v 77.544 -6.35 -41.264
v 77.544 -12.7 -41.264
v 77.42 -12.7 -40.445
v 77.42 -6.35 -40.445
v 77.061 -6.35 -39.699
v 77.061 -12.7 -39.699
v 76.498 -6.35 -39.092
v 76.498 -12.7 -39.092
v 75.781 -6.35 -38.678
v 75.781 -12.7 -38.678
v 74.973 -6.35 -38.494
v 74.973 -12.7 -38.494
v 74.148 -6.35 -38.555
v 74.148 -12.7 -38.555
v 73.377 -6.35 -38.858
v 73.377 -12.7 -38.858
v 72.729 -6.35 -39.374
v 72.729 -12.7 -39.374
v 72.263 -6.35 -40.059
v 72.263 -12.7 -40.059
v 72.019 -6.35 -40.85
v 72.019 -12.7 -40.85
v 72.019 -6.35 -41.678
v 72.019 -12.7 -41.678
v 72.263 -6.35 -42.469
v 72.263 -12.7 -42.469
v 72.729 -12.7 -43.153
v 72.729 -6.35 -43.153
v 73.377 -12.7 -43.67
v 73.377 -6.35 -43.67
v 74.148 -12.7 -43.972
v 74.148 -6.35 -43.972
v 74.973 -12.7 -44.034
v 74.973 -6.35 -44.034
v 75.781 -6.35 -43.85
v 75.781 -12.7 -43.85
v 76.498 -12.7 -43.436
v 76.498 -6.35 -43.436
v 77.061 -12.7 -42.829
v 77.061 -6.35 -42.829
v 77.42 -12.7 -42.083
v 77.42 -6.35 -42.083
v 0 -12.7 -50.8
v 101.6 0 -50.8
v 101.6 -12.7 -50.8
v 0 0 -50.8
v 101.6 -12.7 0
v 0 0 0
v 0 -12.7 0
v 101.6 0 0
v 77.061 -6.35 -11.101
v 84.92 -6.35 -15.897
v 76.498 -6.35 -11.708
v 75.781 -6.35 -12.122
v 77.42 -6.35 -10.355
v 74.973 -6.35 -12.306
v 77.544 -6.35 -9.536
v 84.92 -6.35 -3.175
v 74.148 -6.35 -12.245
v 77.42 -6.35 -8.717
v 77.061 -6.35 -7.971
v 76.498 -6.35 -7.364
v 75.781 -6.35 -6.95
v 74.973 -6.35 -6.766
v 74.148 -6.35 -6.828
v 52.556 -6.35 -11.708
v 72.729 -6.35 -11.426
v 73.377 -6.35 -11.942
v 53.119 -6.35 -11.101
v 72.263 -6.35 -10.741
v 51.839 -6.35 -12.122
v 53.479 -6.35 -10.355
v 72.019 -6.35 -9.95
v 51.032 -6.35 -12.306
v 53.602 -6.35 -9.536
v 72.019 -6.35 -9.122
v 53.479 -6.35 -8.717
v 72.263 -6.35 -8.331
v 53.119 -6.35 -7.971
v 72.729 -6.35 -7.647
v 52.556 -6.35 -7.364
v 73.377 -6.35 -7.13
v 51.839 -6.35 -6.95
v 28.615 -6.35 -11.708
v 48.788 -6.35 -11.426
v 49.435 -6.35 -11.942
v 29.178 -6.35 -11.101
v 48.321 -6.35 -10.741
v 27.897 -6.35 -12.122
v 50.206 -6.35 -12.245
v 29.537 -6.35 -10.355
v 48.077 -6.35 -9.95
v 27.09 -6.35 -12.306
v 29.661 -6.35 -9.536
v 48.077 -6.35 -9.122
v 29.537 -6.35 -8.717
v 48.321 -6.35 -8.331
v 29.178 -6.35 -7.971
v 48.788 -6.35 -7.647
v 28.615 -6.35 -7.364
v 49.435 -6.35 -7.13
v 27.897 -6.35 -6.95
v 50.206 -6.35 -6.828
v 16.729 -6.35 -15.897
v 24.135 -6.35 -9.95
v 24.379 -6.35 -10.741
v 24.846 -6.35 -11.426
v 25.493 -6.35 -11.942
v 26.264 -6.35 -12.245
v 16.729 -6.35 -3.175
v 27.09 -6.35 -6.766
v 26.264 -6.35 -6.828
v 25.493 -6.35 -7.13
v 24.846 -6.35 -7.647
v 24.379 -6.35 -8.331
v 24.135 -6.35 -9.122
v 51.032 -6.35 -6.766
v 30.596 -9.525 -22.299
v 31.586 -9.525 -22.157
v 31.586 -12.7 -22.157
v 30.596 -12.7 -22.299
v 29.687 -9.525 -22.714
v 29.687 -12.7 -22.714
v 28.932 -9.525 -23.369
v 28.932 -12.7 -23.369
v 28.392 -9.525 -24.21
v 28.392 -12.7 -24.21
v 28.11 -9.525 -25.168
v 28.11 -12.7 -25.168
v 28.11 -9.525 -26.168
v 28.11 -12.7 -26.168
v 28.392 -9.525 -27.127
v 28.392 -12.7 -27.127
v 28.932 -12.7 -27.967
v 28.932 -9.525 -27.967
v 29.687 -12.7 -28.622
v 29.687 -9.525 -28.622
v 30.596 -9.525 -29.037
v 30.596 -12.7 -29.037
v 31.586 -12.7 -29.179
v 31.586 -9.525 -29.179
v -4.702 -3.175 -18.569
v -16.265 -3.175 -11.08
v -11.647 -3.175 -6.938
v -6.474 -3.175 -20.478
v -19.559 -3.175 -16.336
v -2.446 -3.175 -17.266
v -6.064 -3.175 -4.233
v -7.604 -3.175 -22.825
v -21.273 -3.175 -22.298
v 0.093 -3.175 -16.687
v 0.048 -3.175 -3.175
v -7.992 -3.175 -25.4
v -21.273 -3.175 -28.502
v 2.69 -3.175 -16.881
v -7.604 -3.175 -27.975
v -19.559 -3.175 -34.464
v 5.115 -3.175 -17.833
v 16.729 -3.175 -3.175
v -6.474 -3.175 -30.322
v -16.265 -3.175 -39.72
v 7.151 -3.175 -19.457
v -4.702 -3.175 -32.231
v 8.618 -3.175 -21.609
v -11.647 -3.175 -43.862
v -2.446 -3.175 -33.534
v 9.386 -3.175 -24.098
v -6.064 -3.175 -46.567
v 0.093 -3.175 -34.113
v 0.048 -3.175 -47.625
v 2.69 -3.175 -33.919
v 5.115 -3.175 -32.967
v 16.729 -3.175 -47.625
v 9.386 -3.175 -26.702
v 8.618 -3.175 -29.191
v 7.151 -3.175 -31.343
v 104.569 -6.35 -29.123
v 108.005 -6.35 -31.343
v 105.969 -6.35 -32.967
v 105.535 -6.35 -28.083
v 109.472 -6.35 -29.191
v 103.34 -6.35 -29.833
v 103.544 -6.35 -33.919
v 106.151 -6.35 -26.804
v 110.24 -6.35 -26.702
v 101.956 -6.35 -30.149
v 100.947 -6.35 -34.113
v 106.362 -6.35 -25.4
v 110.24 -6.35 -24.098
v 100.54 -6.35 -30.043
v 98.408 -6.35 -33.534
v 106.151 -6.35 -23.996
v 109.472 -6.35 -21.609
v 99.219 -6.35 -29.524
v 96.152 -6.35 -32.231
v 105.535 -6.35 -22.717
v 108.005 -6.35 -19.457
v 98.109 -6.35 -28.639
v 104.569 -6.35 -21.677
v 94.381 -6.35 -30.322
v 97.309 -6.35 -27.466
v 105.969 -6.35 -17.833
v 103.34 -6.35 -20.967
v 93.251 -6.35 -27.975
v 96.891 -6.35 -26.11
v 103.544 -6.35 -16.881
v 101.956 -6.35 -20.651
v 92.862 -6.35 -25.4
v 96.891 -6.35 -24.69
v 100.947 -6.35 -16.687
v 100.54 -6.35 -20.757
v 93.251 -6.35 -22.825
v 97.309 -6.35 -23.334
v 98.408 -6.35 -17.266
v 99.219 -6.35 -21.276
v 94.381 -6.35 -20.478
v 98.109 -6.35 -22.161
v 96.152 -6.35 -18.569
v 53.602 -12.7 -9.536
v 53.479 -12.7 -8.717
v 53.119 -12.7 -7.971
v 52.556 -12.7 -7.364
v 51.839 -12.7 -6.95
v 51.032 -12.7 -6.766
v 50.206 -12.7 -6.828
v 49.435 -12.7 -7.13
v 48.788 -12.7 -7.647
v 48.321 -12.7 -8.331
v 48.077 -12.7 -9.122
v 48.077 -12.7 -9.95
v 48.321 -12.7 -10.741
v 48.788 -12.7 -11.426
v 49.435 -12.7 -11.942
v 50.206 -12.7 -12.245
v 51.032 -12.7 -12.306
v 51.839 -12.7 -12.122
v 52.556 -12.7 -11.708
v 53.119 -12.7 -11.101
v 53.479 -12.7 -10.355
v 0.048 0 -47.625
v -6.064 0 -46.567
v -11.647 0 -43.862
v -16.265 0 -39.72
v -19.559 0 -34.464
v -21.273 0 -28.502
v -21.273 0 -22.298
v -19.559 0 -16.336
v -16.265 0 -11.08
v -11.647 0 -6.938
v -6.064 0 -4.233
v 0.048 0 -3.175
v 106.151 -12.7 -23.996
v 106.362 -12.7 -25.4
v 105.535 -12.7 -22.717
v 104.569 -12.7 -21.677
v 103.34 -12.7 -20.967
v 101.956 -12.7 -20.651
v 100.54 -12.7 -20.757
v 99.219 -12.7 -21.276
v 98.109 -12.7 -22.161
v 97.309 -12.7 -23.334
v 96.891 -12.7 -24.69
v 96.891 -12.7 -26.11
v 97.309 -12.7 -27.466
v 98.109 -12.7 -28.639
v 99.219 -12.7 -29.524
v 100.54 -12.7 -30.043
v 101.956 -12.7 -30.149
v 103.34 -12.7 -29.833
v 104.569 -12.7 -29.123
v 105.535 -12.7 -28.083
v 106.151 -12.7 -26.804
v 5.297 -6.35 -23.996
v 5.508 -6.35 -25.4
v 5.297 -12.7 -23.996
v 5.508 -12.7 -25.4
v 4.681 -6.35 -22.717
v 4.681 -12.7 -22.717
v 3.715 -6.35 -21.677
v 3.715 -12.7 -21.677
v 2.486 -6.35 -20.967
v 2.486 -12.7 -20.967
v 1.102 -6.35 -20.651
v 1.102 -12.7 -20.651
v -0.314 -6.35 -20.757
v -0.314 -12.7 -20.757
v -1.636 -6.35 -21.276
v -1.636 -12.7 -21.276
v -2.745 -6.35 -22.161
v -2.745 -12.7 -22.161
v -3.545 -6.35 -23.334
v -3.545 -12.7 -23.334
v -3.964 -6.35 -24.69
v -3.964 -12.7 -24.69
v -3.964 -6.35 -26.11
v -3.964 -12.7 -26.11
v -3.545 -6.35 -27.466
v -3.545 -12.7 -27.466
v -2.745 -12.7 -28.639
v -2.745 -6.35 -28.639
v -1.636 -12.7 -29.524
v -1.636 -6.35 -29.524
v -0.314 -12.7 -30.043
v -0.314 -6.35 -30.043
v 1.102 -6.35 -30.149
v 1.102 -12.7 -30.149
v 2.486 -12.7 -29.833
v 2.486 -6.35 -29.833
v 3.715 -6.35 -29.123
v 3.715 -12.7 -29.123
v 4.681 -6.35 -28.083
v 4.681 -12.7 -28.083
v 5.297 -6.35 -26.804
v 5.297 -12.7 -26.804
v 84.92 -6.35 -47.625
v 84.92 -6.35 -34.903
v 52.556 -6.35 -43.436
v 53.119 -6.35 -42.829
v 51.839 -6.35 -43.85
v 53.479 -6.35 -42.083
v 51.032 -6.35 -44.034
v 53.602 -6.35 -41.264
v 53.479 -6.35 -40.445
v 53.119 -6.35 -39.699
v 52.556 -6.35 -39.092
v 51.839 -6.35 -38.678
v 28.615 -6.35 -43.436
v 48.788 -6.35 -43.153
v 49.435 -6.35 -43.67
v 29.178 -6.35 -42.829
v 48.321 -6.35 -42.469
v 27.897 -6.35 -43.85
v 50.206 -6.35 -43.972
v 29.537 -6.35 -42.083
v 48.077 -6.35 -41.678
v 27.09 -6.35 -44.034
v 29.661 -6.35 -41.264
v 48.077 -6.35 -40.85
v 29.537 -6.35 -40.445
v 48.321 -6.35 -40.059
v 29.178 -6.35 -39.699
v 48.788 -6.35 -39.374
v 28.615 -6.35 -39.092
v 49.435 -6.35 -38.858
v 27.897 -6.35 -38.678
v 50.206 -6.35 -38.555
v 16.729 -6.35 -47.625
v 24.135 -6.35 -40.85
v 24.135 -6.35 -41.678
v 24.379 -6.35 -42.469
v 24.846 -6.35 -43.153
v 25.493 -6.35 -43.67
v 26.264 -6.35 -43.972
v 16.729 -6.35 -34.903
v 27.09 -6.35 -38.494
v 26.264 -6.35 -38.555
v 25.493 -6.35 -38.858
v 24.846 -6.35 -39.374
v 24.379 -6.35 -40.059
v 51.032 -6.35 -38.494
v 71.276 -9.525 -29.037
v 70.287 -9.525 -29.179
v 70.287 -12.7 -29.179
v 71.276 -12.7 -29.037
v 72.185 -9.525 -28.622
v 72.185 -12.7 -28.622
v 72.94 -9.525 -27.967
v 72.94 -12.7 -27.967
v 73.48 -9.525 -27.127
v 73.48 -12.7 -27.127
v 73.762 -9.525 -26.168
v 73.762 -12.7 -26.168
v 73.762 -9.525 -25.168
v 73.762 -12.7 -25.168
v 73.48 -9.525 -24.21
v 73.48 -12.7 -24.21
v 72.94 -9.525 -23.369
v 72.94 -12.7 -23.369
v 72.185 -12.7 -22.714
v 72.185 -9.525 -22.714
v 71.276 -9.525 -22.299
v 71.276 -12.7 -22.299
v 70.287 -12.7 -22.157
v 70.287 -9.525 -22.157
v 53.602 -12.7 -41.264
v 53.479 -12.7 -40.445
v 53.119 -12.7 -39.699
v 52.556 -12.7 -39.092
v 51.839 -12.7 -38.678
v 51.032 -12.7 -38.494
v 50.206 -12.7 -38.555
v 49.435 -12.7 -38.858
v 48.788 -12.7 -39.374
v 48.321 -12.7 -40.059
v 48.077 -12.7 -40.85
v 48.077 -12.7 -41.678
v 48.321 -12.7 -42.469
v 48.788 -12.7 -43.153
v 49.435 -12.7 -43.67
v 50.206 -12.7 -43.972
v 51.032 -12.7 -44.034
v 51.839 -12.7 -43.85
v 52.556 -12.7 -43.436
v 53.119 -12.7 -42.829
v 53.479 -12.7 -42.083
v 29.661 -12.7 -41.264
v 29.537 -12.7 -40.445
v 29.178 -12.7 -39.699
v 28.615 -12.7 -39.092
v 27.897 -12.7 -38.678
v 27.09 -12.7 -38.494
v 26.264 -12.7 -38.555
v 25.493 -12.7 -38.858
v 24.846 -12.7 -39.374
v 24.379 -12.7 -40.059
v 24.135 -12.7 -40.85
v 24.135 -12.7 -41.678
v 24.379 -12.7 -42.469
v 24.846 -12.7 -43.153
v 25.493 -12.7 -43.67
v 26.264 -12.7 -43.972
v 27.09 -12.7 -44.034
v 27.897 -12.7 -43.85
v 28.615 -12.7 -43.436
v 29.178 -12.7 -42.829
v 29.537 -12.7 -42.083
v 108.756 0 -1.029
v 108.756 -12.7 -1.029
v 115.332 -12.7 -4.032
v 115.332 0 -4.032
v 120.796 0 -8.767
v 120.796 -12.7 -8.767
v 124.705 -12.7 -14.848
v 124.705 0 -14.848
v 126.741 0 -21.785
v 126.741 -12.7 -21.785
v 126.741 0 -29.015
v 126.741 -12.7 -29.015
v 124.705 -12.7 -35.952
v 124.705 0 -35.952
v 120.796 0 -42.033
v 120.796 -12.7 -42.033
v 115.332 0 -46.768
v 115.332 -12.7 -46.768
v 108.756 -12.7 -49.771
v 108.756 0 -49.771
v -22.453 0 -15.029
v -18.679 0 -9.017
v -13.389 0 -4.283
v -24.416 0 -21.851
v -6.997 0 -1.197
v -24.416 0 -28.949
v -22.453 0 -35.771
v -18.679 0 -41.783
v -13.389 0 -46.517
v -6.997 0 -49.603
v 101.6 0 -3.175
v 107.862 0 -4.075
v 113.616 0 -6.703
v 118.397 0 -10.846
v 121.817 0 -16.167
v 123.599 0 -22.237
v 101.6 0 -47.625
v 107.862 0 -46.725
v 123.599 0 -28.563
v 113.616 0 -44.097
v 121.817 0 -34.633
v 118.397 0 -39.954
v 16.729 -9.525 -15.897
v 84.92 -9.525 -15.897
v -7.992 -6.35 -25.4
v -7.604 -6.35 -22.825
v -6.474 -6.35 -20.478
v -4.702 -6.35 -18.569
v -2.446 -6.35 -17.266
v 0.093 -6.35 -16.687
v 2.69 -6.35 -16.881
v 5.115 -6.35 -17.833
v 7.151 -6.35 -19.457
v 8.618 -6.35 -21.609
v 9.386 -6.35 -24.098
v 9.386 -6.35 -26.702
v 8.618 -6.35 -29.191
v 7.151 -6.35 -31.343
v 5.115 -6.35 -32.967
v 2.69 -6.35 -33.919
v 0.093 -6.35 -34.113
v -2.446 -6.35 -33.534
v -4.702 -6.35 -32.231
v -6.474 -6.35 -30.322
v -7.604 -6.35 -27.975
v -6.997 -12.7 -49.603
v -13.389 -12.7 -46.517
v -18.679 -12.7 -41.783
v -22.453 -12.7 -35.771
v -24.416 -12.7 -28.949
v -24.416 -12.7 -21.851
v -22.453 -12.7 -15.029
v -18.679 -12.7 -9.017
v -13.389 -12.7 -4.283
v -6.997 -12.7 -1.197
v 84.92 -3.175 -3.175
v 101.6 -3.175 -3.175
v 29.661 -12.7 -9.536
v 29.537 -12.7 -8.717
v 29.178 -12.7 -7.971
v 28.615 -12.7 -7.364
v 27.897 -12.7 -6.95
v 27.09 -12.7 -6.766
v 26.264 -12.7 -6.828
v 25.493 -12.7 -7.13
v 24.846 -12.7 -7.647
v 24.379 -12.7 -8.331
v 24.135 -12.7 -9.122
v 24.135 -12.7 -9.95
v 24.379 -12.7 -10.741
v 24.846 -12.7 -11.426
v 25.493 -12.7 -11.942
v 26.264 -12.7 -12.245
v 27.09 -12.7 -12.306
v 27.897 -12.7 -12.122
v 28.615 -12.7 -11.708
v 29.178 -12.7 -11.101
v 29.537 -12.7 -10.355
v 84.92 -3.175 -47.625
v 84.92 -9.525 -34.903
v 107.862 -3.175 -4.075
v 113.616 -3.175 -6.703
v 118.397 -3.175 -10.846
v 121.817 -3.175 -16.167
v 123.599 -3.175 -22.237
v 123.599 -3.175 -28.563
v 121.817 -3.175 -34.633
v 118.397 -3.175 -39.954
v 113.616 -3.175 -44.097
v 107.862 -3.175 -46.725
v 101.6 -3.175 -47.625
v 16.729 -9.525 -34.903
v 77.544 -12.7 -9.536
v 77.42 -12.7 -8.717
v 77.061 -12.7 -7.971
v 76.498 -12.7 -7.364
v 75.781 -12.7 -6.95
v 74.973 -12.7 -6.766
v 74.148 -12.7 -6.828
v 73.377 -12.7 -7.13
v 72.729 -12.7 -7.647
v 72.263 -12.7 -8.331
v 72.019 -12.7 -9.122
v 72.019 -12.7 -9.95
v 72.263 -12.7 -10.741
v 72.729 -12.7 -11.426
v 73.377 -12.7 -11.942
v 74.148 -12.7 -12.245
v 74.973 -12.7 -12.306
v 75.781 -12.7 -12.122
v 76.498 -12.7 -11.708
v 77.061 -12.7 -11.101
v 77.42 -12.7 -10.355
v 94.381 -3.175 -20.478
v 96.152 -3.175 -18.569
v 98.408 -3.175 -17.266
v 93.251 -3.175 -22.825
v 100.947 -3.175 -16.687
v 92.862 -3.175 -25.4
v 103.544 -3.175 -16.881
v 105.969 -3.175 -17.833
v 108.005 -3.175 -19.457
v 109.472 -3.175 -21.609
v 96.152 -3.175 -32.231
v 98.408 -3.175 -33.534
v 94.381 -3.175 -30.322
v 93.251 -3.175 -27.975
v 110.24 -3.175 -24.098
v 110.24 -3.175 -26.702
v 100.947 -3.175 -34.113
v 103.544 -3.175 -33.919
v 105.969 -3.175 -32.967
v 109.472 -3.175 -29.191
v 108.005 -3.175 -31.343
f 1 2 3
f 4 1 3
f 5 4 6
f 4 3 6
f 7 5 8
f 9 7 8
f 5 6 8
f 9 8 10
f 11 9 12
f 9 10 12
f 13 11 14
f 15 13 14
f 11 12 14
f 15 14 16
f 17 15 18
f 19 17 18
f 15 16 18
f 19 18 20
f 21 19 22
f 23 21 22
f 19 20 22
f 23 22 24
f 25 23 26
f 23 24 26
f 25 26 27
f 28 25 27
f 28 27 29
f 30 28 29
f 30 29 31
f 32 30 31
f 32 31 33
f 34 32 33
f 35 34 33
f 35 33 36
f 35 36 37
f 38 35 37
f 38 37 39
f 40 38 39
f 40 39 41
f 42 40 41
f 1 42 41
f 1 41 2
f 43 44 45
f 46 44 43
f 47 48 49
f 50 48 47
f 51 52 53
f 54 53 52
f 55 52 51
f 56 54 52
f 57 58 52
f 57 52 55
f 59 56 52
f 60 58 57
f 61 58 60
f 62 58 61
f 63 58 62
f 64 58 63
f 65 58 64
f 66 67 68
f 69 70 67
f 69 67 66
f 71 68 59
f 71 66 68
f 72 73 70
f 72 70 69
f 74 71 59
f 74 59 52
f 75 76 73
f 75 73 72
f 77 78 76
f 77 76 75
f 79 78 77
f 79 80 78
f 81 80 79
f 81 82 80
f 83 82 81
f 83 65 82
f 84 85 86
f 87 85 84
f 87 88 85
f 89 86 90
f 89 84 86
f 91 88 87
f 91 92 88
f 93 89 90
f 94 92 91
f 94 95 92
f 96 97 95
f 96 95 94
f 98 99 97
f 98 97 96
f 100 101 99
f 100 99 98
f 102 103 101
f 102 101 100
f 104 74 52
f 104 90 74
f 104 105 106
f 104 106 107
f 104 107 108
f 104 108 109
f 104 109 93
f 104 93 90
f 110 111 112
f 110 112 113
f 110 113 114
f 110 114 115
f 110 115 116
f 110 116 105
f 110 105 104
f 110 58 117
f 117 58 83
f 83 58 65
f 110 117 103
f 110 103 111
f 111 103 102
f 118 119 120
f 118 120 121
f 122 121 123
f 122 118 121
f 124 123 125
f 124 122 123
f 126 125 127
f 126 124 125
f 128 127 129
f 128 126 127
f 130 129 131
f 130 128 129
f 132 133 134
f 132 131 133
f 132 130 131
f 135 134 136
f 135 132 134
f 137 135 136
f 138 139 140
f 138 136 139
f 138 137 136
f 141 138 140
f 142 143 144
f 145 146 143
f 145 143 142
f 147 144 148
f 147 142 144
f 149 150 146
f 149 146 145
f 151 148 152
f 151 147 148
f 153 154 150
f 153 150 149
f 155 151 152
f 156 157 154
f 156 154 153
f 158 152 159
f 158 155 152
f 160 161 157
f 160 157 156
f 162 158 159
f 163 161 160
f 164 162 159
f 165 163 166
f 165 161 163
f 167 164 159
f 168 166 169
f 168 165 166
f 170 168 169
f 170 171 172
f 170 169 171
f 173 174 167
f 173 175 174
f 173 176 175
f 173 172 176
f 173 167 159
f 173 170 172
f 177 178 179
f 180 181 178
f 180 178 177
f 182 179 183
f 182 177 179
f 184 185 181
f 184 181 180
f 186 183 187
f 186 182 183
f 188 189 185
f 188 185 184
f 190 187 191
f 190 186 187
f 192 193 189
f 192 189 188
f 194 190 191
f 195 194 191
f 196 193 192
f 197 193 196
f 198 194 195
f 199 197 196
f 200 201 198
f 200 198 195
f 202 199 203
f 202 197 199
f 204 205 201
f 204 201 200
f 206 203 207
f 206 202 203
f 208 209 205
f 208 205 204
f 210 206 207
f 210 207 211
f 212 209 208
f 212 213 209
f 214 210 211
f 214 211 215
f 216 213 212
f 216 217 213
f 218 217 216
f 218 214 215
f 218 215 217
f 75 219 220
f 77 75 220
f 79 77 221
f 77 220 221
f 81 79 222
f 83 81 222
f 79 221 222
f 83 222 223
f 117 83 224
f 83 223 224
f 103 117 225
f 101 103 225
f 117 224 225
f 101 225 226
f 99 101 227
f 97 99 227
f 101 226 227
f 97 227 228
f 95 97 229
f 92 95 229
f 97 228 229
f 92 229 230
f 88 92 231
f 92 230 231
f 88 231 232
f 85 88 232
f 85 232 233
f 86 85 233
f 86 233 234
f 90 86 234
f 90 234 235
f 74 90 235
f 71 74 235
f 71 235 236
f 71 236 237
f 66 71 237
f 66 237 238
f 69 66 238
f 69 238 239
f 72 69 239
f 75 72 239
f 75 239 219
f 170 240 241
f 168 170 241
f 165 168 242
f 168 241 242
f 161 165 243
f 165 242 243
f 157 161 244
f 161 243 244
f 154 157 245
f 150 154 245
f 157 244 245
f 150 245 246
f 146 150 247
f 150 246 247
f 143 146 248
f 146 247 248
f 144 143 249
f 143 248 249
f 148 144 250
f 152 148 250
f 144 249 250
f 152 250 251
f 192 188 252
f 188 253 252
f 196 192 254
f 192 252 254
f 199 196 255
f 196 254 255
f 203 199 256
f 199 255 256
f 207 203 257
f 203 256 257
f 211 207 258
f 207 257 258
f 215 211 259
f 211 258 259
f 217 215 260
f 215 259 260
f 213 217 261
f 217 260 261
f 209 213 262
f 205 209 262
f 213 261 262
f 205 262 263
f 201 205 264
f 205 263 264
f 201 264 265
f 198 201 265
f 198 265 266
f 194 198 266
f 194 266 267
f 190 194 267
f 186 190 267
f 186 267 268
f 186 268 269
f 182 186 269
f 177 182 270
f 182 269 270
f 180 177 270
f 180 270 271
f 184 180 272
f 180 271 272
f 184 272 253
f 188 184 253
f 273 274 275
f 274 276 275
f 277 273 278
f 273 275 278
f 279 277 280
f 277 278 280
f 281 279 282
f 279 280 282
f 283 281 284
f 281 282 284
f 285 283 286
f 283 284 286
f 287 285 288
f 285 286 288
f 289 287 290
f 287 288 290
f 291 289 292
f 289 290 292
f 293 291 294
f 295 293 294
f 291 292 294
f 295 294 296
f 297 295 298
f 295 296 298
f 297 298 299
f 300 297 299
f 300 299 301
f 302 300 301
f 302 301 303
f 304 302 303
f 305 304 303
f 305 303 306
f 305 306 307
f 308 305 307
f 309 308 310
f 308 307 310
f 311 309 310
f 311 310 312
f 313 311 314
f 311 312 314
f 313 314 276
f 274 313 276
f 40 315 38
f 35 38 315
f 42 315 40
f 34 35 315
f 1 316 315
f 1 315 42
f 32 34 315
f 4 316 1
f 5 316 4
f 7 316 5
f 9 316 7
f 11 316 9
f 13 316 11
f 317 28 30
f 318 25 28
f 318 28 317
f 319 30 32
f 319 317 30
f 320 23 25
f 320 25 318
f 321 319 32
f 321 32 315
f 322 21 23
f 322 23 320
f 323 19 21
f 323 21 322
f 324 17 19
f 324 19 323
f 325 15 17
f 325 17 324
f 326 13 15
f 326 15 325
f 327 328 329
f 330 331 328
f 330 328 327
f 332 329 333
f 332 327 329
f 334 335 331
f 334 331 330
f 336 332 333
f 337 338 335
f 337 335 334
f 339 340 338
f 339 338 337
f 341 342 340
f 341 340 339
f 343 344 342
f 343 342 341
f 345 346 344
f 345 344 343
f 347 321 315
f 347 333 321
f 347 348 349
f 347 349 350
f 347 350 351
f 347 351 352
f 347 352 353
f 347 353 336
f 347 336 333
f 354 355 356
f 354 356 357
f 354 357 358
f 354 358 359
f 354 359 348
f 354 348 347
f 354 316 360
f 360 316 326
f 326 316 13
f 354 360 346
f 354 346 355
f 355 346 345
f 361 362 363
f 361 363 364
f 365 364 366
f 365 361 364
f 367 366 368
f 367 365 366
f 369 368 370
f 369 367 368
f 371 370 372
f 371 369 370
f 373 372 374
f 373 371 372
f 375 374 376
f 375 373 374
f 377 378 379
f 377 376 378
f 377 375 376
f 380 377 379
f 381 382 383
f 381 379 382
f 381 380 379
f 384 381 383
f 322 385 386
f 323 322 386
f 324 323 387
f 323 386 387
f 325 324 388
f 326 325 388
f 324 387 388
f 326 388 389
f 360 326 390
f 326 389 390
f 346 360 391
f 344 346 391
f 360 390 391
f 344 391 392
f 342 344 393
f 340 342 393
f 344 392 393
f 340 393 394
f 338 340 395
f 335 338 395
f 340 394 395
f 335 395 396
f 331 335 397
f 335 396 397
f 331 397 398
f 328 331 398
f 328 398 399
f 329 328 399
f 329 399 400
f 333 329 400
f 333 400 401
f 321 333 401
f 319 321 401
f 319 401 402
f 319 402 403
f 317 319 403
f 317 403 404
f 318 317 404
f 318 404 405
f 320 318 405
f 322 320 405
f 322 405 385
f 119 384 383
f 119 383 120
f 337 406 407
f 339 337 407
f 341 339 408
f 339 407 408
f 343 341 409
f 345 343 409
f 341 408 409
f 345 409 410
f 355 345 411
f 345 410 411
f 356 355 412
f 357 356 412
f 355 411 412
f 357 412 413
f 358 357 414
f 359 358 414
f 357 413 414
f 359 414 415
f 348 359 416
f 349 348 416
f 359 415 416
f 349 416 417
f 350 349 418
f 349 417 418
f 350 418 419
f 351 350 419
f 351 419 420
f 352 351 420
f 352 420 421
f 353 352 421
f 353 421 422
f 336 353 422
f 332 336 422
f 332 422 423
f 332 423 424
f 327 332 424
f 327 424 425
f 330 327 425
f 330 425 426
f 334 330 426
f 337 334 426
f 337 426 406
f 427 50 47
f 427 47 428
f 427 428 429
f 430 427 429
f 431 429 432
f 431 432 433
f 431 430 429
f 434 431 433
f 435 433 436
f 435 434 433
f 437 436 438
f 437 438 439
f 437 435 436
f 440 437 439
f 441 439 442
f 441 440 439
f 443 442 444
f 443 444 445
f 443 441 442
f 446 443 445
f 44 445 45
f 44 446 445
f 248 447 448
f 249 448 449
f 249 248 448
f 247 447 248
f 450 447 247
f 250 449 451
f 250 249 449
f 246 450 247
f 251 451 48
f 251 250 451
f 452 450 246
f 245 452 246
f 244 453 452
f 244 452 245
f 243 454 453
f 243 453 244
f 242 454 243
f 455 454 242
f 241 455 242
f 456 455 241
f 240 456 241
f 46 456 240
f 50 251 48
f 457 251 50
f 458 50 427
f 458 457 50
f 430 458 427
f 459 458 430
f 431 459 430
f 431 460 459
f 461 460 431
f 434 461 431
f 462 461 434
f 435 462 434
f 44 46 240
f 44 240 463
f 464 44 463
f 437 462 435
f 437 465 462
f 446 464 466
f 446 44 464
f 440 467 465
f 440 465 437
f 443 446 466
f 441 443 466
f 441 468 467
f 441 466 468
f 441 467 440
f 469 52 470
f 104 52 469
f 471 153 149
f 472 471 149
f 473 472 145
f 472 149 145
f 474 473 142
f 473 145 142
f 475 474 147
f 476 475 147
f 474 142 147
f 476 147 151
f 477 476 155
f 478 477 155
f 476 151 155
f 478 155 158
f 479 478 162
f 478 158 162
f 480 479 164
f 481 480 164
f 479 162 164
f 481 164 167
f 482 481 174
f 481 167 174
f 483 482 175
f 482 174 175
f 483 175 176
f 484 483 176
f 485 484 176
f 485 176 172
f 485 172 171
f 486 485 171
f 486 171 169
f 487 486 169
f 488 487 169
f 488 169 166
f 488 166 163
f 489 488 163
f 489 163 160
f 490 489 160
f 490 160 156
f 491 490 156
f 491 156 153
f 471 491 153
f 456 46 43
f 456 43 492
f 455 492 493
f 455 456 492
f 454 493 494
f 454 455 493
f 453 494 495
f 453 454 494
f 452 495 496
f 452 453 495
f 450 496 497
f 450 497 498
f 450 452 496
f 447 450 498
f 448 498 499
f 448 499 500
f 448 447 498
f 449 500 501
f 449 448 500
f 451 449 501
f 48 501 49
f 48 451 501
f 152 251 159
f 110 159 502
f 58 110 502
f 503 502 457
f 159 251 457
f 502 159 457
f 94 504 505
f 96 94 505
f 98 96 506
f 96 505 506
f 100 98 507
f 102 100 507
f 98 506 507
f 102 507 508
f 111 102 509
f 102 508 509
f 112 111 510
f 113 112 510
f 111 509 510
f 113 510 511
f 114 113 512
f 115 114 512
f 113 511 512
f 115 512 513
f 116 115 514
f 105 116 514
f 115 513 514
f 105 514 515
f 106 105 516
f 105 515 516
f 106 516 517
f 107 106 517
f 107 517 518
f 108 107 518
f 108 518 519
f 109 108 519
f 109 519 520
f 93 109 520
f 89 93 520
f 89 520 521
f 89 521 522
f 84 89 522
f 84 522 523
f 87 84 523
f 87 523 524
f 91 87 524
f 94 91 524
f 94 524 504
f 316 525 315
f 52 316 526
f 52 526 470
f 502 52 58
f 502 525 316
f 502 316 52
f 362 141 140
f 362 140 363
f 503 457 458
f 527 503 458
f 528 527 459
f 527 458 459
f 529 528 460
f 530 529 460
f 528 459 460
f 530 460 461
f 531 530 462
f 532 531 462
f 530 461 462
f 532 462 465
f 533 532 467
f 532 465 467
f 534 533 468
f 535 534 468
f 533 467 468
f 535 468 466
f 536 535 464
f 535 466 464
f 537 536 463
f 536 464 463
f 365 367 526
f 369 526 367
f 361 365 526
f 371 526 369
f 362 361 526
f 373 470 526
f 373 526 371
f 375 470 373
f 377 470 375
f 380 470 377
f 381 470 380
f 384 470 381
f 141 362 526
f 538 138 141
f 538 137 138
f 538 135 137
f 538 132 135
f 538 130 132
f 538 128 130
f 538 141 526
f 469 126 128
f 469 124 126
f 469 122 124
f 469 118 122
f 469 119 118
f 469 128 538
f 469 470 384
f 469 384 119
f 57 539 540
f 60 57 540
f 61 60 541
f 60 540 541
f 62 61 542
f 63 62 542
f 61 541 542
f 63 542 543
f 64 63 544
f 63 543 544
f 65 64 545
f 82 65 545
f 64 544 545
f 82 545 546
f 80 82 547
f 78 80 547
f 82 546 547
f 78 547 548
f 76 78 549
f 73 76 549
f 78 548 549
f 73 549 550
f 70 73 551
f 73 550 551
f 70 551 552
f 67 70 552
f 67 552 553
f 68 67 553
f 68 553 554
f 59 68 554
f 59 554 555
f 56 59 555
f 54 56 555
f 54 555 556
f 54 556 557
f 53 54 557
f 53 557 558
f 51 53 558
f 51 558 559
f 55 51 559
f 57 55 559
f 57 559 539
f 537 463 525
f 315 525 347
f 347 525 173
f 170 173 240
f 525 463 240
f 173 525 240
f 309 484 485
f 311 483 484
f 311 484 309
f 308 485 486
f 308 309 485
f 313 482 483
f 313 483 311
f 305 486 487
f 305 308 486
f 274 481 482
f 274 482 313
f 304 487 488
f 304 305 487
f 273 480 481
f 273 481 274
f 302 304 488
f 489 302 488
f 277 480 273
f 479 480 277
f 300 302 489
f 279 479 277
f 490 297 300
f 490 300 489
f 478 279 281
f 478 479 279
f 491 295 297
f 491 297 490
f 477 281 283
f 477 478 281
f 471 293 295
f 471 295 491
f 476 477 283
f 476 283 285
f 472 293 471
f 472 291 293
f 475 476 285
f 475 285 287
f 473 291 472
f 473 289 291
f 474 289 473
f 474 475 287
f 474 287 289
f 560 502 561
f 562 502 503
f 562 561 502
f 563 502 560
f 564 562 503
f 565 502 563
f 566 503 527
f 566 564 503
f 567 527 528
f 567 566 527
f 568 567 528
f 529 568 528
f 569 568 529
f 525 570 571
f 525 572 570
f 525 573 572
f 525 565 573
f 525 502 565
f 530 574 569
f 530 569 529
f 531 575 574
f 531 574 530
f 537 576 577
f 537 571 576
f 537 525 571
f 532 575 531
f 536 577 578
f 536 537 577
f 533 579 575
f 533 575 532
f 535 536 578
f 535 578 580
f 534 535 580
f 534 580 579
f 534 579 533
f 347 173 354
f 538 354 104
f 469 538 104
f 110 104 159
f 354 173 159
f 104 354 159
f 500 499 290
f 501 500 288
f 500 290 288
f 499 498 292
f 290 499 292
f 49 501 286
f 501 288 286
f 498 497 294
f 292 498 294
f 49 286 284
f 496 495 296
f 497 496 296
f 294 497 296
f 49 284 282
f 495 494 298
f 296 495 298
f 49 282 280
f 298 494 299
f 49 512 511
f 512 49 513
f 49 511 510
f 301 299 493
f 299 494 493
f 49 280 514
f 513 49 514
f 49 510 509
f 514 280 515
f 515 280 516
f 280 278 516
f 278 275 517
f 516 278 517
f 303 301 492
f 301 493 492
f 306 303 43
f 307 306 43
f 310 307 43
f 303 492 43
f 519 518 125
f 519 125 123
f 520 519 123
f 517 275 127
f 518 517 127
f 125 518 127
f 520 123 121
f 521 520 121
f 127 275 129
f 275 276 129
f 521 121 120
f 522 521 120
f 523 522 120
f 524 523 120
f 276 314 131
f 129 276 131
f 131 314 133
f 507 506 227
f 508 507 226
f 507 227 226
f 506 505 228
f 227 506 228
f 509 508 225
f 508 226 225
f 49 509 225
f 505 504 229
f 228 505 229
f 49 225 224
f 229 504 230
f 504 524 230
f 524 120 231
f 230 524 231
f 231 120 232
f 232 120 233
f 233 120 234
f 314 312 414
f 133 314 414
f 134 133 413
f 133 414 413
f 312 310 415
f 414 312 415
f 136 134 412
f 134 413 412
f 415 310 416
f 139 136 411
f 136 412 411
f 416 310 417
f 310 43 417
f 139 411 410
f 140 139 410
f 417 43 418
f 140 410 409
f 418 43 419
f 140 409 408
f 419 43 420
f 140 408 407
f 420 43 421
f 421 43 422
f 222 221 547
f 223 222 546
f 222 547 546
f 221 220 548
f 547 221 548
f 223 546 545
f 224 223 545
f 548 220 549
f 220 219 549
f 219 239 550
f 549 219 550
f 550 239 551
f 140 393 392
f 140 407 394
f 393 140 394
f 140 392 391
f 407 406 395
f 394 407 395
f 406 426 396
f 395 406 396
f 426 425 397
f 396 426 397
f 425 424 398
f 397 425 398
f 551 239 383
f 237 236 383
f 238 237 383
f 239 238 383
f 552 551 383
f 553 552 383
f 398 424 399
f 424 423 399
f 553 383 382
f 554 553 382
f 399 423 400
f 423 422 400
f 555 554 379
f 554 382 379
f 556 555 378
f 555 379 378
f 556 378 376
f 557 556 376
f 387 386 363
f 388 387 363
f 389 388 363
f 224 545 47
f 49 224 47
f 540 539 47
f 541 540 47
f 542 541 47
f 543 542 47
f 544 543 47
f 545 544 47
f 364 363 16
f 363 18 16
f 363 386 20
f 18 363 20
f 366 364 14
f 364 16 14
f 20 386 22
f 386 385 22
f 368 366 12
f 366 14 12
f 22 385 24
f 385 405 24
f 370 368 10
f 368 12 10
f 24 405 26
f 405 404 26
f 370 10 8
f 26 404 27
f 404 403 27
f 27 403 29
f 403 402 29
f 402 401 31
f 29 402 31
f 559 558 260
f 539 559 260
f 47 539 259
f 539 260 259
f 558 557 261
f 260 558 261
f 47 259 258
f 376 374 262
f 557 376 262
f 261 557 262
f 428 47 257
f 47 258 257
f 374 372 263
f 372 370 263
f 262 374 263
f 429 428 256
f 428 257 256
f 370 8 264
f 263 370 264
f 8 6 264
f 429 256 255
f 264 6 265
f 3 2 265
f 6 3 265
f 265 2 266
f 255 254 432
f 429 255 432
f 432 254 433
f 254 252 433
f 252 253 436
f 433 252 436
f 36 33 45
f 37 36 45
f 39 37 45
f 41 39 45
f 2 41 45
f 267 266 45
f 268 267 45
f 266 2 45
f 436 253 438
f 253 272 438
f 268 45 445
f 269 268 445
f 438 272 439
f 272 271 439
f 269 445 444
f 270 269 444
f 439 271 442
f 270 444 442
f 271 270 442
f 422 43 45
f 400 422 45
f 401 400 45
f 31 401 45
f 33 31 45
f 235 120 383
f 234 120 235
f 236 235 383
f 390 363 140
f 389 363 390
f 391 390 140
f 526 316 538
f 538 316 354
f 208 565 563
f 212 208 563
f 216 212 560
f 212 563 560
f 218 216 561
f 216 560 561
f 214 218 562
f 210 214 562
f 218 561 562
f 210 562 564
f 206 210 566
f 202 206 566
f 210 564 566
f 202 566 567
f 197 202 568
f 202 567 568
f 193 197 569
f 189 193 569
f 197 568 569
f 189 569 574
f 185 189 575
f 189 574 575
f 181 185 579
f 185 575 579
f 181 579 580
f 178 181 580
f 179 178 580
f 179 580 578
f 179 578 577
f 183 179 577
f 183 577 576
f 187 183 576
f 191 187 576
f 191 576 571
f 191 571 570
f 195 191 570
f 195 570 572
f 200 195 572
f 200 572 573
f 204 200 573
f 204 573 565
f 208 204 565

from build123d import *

# Parameters (mm, degrees)
EXTRUDE1_DEPTH                                       = 12.7
EXTRUDE2_DEPTH                                       = 3.175
SKETCH3_W                                            = 68.191134733
SKETCH3_H                                            = 44.45
EXTRUDE3_DEPTH                                       = 3.175
SKETCH4_W                                            = 68.191134733
SKETCH4_H                                            = 19.005533376
EXTRUDE4_DEPTH                                       = 3.175
EXTRUDE6_DEPTH                                       = 137.930502446
CBORE_FOR_1_4_BINDING_HEAD_MACHINE_SCREW_D           = 9.525
CBORE_FOR_1_4_BINDING_HEAD_MACHINE_SCREW_CBORE_D     = 17.4752
CBORE_FOR_1_4_BINDING_HEAD_MACHINE_SCREW_CBORE_DEPTH = 3.175
F_7_32_0_21875_DIAMETER_HOLE1_D                      = 5.55625
F_7_32_0_21875_DIAMETER_HOLE1_DEPTH                  = 25.4
F_7_32_0_21875_DIAMETER_HOLE1_TIP                    = 1.669265907
F_7_32_0_21875_DIAMETER_HOLE2_D                      = 5.55625
F_7_32_0_21875_DIAMETER_HOLE2_DEPTH                  = 25.4
F_7_32_0_21875_DIAMETER_HOLE2_TIP                    = 1.669265907


with BuildPart() as part:
    # Sketch1 → Extrude1 (new body)
    with BuildSketch(Plane(origin=(0, 0, 0), x_dir=(1, 0, 0), z_dir=(0, 1, 0))):
        with BuildLine():
            Line((0, 0), (101.6, 0))
            ThreePointArc((101.6, 0), (127, 25.4), (101.6, 50.8))
            Line((101.6, 50.8), (0, 50.8))
            ThreePointArc((0, 50.8), (-24.665230296, 25.4), (0, 0))
        make_face()
    extrude(amount=-EXTRUDE1_DEPTH)

    # Sketch2 → Extrude2 (cut)
    with BuildSketch(Plane(origin=(0, 0, 0), x_dir=(1, 0, 0), z_dir=(0, 1, 0))):
        with BuildLine():
            Line((101.6, 47.625), (0.048151693, 47.625))
            ThreePointArc((0.048151693, 47.625), (-21.490230296, 25.4), (0.048151693, 3.175))
            Line((0.048151693, 3.175), (101.6, 3.175))
            ThreePointArc((101.6, 3.175), (123.825, 25.4), (101.6, 47.625))
        make_face()
    extrude(amount=-EXTRUDE2_DEPTH, mode=Mode.SUBTRACT)

    # Sketch3 → Extrude3 (cut)
    with BuildSketch(Plane(origin=(0, -3.175, 0), x_dir=(-1, 0, 0), z_dir=(0, 1, 0))):
        with Locations((-50.824075847, -25.4)):
            Rectangle(SKETCH3_W, SKETCH3_H)
    extrude(amount=-EXTRUDE3_DEPTH, mode=Mode.SUBTRACT)

    # Sketch4 → Extrude4 (cut)
    with BuildSketch(Plane(origin=(0, -6.35, 0), x_dir=(-1, 0, 0), z_dir=(0, 1, 0))):
        with Locations((-50.824075847, -25.4)):
            Rectangle(SKETCH4_W, SKETCH4_H)
    extrude(amount=-EXTRUDE4_DEPTH, mode=Mode.SUBTRACT)

    # Sketch6 → Extrude6 (cut, through all)
    with BuildSketch(Plane(origin=(0, -6.35, 0), x_dir=(-1, 0, 0), z_dir=(0, 1, 0))):
        with BuildLine():
            Line((-70.286653385, -22.157058497), (-31.585524424, -22.157058497))
            ThreePointArc((-31.585524424, -22.157058497), (-28.07443844, -25.668144481), (-31.585524424, -29.179230465))
            Line((-31.585524424, -29.179230465), (-70.286653385, -29.179230465))
            ThreePointArc((-70.286653385, -29.179230465), (-73.797739369, -25.668144481), (-70.286653385, -22.157058497))
        make_face()
    extrude(amount=-EXTRUDE6_DEPTH, mode=Mode.SUBTRACT)

    # CBORE for 1/4 Binding Head Machine Screw2 (through all)
    with Locations(Plane(origin=(0, -3.175, 0), x_dir=(-1, 0, 0), z_dir=(0, 1, 0))):
        with Locations((-0.745713987, -25.4), (-101.6, -25.4)):
            CounterBoreHole(CBORE_FOR_1_4_BINDING_HEAD_MACHINE_SCREW_D / 2, CBORE_FOR_1_4_BINDING_HEAD_MACHINE_SCREW_CBORE_D / 2, CBORE_FOR_1_4_BINDING_HEAD_MACHINE_SCREW_CBORE_DEPTH)

    # 7/32 (0.21875) Diameter Hole1
    with Locations(Plane(origin=(0, -6.35, 0), x_dir=(-1, 0, 0), z_dir=(0, 1, 0))):
        with Locations((-26.882460023, -9.536116656)):
            Hole(F_7_32_0_21875_DIAMETER_HOLE1_D / 2, depth=F_7_32_0_21875_DIAMETER_HOLE1_DEPTH)
            with Locations((0, 0, -(F_7_32_0_21875_DIAMETER_HOLE1_DEPTH + F_7_32_0_21875_DIAMETER_HOLE1_TIP / 2))):  # 118° drill point
                Cone(0, F_7_32_0_21875_DIAMETER_HOLE1_D / 2, F_7_32_0_21875_DIAMETER_HOLE1_TIP, mode=Mode.SUBTRACT)

    # 7/32 (0.21875) Diameter Hole2
    with Locations(Plane(origin=(0, -6.35, 0), x_dir=(-1, 0, 0), z_dir=(0, 1, 0))):
        with Locations((-50.824075847, -9.536116656), (-74.76569167, -9.536116656), (-26.882460023, -41.263883344), (-50.824075847, -41.263883344), (-74.76569167, -41.263883344)):
            Hole(F_7_32_0_21875_DIAMETER_HOLE2_D / 2, depth=F_7_32_0_21875_DIAMETER_HOLE2_DEPTH)
            with Locations((0, 0, -(F_7_32_0_21875_DIAMETER_HOLE2_DEPTH + F_7_32_0_21875_DIAMETER_HOLE2_TIP / 2))):  # 118° drill point
                Cone(0, F_7_32_0_21875_DIAMETER_HOLE2_D / 2, F_7_32_0_21875_DIAMETER_HOLE2_TIP, mode=Mode.SUBTRACT)


solid = part.part
